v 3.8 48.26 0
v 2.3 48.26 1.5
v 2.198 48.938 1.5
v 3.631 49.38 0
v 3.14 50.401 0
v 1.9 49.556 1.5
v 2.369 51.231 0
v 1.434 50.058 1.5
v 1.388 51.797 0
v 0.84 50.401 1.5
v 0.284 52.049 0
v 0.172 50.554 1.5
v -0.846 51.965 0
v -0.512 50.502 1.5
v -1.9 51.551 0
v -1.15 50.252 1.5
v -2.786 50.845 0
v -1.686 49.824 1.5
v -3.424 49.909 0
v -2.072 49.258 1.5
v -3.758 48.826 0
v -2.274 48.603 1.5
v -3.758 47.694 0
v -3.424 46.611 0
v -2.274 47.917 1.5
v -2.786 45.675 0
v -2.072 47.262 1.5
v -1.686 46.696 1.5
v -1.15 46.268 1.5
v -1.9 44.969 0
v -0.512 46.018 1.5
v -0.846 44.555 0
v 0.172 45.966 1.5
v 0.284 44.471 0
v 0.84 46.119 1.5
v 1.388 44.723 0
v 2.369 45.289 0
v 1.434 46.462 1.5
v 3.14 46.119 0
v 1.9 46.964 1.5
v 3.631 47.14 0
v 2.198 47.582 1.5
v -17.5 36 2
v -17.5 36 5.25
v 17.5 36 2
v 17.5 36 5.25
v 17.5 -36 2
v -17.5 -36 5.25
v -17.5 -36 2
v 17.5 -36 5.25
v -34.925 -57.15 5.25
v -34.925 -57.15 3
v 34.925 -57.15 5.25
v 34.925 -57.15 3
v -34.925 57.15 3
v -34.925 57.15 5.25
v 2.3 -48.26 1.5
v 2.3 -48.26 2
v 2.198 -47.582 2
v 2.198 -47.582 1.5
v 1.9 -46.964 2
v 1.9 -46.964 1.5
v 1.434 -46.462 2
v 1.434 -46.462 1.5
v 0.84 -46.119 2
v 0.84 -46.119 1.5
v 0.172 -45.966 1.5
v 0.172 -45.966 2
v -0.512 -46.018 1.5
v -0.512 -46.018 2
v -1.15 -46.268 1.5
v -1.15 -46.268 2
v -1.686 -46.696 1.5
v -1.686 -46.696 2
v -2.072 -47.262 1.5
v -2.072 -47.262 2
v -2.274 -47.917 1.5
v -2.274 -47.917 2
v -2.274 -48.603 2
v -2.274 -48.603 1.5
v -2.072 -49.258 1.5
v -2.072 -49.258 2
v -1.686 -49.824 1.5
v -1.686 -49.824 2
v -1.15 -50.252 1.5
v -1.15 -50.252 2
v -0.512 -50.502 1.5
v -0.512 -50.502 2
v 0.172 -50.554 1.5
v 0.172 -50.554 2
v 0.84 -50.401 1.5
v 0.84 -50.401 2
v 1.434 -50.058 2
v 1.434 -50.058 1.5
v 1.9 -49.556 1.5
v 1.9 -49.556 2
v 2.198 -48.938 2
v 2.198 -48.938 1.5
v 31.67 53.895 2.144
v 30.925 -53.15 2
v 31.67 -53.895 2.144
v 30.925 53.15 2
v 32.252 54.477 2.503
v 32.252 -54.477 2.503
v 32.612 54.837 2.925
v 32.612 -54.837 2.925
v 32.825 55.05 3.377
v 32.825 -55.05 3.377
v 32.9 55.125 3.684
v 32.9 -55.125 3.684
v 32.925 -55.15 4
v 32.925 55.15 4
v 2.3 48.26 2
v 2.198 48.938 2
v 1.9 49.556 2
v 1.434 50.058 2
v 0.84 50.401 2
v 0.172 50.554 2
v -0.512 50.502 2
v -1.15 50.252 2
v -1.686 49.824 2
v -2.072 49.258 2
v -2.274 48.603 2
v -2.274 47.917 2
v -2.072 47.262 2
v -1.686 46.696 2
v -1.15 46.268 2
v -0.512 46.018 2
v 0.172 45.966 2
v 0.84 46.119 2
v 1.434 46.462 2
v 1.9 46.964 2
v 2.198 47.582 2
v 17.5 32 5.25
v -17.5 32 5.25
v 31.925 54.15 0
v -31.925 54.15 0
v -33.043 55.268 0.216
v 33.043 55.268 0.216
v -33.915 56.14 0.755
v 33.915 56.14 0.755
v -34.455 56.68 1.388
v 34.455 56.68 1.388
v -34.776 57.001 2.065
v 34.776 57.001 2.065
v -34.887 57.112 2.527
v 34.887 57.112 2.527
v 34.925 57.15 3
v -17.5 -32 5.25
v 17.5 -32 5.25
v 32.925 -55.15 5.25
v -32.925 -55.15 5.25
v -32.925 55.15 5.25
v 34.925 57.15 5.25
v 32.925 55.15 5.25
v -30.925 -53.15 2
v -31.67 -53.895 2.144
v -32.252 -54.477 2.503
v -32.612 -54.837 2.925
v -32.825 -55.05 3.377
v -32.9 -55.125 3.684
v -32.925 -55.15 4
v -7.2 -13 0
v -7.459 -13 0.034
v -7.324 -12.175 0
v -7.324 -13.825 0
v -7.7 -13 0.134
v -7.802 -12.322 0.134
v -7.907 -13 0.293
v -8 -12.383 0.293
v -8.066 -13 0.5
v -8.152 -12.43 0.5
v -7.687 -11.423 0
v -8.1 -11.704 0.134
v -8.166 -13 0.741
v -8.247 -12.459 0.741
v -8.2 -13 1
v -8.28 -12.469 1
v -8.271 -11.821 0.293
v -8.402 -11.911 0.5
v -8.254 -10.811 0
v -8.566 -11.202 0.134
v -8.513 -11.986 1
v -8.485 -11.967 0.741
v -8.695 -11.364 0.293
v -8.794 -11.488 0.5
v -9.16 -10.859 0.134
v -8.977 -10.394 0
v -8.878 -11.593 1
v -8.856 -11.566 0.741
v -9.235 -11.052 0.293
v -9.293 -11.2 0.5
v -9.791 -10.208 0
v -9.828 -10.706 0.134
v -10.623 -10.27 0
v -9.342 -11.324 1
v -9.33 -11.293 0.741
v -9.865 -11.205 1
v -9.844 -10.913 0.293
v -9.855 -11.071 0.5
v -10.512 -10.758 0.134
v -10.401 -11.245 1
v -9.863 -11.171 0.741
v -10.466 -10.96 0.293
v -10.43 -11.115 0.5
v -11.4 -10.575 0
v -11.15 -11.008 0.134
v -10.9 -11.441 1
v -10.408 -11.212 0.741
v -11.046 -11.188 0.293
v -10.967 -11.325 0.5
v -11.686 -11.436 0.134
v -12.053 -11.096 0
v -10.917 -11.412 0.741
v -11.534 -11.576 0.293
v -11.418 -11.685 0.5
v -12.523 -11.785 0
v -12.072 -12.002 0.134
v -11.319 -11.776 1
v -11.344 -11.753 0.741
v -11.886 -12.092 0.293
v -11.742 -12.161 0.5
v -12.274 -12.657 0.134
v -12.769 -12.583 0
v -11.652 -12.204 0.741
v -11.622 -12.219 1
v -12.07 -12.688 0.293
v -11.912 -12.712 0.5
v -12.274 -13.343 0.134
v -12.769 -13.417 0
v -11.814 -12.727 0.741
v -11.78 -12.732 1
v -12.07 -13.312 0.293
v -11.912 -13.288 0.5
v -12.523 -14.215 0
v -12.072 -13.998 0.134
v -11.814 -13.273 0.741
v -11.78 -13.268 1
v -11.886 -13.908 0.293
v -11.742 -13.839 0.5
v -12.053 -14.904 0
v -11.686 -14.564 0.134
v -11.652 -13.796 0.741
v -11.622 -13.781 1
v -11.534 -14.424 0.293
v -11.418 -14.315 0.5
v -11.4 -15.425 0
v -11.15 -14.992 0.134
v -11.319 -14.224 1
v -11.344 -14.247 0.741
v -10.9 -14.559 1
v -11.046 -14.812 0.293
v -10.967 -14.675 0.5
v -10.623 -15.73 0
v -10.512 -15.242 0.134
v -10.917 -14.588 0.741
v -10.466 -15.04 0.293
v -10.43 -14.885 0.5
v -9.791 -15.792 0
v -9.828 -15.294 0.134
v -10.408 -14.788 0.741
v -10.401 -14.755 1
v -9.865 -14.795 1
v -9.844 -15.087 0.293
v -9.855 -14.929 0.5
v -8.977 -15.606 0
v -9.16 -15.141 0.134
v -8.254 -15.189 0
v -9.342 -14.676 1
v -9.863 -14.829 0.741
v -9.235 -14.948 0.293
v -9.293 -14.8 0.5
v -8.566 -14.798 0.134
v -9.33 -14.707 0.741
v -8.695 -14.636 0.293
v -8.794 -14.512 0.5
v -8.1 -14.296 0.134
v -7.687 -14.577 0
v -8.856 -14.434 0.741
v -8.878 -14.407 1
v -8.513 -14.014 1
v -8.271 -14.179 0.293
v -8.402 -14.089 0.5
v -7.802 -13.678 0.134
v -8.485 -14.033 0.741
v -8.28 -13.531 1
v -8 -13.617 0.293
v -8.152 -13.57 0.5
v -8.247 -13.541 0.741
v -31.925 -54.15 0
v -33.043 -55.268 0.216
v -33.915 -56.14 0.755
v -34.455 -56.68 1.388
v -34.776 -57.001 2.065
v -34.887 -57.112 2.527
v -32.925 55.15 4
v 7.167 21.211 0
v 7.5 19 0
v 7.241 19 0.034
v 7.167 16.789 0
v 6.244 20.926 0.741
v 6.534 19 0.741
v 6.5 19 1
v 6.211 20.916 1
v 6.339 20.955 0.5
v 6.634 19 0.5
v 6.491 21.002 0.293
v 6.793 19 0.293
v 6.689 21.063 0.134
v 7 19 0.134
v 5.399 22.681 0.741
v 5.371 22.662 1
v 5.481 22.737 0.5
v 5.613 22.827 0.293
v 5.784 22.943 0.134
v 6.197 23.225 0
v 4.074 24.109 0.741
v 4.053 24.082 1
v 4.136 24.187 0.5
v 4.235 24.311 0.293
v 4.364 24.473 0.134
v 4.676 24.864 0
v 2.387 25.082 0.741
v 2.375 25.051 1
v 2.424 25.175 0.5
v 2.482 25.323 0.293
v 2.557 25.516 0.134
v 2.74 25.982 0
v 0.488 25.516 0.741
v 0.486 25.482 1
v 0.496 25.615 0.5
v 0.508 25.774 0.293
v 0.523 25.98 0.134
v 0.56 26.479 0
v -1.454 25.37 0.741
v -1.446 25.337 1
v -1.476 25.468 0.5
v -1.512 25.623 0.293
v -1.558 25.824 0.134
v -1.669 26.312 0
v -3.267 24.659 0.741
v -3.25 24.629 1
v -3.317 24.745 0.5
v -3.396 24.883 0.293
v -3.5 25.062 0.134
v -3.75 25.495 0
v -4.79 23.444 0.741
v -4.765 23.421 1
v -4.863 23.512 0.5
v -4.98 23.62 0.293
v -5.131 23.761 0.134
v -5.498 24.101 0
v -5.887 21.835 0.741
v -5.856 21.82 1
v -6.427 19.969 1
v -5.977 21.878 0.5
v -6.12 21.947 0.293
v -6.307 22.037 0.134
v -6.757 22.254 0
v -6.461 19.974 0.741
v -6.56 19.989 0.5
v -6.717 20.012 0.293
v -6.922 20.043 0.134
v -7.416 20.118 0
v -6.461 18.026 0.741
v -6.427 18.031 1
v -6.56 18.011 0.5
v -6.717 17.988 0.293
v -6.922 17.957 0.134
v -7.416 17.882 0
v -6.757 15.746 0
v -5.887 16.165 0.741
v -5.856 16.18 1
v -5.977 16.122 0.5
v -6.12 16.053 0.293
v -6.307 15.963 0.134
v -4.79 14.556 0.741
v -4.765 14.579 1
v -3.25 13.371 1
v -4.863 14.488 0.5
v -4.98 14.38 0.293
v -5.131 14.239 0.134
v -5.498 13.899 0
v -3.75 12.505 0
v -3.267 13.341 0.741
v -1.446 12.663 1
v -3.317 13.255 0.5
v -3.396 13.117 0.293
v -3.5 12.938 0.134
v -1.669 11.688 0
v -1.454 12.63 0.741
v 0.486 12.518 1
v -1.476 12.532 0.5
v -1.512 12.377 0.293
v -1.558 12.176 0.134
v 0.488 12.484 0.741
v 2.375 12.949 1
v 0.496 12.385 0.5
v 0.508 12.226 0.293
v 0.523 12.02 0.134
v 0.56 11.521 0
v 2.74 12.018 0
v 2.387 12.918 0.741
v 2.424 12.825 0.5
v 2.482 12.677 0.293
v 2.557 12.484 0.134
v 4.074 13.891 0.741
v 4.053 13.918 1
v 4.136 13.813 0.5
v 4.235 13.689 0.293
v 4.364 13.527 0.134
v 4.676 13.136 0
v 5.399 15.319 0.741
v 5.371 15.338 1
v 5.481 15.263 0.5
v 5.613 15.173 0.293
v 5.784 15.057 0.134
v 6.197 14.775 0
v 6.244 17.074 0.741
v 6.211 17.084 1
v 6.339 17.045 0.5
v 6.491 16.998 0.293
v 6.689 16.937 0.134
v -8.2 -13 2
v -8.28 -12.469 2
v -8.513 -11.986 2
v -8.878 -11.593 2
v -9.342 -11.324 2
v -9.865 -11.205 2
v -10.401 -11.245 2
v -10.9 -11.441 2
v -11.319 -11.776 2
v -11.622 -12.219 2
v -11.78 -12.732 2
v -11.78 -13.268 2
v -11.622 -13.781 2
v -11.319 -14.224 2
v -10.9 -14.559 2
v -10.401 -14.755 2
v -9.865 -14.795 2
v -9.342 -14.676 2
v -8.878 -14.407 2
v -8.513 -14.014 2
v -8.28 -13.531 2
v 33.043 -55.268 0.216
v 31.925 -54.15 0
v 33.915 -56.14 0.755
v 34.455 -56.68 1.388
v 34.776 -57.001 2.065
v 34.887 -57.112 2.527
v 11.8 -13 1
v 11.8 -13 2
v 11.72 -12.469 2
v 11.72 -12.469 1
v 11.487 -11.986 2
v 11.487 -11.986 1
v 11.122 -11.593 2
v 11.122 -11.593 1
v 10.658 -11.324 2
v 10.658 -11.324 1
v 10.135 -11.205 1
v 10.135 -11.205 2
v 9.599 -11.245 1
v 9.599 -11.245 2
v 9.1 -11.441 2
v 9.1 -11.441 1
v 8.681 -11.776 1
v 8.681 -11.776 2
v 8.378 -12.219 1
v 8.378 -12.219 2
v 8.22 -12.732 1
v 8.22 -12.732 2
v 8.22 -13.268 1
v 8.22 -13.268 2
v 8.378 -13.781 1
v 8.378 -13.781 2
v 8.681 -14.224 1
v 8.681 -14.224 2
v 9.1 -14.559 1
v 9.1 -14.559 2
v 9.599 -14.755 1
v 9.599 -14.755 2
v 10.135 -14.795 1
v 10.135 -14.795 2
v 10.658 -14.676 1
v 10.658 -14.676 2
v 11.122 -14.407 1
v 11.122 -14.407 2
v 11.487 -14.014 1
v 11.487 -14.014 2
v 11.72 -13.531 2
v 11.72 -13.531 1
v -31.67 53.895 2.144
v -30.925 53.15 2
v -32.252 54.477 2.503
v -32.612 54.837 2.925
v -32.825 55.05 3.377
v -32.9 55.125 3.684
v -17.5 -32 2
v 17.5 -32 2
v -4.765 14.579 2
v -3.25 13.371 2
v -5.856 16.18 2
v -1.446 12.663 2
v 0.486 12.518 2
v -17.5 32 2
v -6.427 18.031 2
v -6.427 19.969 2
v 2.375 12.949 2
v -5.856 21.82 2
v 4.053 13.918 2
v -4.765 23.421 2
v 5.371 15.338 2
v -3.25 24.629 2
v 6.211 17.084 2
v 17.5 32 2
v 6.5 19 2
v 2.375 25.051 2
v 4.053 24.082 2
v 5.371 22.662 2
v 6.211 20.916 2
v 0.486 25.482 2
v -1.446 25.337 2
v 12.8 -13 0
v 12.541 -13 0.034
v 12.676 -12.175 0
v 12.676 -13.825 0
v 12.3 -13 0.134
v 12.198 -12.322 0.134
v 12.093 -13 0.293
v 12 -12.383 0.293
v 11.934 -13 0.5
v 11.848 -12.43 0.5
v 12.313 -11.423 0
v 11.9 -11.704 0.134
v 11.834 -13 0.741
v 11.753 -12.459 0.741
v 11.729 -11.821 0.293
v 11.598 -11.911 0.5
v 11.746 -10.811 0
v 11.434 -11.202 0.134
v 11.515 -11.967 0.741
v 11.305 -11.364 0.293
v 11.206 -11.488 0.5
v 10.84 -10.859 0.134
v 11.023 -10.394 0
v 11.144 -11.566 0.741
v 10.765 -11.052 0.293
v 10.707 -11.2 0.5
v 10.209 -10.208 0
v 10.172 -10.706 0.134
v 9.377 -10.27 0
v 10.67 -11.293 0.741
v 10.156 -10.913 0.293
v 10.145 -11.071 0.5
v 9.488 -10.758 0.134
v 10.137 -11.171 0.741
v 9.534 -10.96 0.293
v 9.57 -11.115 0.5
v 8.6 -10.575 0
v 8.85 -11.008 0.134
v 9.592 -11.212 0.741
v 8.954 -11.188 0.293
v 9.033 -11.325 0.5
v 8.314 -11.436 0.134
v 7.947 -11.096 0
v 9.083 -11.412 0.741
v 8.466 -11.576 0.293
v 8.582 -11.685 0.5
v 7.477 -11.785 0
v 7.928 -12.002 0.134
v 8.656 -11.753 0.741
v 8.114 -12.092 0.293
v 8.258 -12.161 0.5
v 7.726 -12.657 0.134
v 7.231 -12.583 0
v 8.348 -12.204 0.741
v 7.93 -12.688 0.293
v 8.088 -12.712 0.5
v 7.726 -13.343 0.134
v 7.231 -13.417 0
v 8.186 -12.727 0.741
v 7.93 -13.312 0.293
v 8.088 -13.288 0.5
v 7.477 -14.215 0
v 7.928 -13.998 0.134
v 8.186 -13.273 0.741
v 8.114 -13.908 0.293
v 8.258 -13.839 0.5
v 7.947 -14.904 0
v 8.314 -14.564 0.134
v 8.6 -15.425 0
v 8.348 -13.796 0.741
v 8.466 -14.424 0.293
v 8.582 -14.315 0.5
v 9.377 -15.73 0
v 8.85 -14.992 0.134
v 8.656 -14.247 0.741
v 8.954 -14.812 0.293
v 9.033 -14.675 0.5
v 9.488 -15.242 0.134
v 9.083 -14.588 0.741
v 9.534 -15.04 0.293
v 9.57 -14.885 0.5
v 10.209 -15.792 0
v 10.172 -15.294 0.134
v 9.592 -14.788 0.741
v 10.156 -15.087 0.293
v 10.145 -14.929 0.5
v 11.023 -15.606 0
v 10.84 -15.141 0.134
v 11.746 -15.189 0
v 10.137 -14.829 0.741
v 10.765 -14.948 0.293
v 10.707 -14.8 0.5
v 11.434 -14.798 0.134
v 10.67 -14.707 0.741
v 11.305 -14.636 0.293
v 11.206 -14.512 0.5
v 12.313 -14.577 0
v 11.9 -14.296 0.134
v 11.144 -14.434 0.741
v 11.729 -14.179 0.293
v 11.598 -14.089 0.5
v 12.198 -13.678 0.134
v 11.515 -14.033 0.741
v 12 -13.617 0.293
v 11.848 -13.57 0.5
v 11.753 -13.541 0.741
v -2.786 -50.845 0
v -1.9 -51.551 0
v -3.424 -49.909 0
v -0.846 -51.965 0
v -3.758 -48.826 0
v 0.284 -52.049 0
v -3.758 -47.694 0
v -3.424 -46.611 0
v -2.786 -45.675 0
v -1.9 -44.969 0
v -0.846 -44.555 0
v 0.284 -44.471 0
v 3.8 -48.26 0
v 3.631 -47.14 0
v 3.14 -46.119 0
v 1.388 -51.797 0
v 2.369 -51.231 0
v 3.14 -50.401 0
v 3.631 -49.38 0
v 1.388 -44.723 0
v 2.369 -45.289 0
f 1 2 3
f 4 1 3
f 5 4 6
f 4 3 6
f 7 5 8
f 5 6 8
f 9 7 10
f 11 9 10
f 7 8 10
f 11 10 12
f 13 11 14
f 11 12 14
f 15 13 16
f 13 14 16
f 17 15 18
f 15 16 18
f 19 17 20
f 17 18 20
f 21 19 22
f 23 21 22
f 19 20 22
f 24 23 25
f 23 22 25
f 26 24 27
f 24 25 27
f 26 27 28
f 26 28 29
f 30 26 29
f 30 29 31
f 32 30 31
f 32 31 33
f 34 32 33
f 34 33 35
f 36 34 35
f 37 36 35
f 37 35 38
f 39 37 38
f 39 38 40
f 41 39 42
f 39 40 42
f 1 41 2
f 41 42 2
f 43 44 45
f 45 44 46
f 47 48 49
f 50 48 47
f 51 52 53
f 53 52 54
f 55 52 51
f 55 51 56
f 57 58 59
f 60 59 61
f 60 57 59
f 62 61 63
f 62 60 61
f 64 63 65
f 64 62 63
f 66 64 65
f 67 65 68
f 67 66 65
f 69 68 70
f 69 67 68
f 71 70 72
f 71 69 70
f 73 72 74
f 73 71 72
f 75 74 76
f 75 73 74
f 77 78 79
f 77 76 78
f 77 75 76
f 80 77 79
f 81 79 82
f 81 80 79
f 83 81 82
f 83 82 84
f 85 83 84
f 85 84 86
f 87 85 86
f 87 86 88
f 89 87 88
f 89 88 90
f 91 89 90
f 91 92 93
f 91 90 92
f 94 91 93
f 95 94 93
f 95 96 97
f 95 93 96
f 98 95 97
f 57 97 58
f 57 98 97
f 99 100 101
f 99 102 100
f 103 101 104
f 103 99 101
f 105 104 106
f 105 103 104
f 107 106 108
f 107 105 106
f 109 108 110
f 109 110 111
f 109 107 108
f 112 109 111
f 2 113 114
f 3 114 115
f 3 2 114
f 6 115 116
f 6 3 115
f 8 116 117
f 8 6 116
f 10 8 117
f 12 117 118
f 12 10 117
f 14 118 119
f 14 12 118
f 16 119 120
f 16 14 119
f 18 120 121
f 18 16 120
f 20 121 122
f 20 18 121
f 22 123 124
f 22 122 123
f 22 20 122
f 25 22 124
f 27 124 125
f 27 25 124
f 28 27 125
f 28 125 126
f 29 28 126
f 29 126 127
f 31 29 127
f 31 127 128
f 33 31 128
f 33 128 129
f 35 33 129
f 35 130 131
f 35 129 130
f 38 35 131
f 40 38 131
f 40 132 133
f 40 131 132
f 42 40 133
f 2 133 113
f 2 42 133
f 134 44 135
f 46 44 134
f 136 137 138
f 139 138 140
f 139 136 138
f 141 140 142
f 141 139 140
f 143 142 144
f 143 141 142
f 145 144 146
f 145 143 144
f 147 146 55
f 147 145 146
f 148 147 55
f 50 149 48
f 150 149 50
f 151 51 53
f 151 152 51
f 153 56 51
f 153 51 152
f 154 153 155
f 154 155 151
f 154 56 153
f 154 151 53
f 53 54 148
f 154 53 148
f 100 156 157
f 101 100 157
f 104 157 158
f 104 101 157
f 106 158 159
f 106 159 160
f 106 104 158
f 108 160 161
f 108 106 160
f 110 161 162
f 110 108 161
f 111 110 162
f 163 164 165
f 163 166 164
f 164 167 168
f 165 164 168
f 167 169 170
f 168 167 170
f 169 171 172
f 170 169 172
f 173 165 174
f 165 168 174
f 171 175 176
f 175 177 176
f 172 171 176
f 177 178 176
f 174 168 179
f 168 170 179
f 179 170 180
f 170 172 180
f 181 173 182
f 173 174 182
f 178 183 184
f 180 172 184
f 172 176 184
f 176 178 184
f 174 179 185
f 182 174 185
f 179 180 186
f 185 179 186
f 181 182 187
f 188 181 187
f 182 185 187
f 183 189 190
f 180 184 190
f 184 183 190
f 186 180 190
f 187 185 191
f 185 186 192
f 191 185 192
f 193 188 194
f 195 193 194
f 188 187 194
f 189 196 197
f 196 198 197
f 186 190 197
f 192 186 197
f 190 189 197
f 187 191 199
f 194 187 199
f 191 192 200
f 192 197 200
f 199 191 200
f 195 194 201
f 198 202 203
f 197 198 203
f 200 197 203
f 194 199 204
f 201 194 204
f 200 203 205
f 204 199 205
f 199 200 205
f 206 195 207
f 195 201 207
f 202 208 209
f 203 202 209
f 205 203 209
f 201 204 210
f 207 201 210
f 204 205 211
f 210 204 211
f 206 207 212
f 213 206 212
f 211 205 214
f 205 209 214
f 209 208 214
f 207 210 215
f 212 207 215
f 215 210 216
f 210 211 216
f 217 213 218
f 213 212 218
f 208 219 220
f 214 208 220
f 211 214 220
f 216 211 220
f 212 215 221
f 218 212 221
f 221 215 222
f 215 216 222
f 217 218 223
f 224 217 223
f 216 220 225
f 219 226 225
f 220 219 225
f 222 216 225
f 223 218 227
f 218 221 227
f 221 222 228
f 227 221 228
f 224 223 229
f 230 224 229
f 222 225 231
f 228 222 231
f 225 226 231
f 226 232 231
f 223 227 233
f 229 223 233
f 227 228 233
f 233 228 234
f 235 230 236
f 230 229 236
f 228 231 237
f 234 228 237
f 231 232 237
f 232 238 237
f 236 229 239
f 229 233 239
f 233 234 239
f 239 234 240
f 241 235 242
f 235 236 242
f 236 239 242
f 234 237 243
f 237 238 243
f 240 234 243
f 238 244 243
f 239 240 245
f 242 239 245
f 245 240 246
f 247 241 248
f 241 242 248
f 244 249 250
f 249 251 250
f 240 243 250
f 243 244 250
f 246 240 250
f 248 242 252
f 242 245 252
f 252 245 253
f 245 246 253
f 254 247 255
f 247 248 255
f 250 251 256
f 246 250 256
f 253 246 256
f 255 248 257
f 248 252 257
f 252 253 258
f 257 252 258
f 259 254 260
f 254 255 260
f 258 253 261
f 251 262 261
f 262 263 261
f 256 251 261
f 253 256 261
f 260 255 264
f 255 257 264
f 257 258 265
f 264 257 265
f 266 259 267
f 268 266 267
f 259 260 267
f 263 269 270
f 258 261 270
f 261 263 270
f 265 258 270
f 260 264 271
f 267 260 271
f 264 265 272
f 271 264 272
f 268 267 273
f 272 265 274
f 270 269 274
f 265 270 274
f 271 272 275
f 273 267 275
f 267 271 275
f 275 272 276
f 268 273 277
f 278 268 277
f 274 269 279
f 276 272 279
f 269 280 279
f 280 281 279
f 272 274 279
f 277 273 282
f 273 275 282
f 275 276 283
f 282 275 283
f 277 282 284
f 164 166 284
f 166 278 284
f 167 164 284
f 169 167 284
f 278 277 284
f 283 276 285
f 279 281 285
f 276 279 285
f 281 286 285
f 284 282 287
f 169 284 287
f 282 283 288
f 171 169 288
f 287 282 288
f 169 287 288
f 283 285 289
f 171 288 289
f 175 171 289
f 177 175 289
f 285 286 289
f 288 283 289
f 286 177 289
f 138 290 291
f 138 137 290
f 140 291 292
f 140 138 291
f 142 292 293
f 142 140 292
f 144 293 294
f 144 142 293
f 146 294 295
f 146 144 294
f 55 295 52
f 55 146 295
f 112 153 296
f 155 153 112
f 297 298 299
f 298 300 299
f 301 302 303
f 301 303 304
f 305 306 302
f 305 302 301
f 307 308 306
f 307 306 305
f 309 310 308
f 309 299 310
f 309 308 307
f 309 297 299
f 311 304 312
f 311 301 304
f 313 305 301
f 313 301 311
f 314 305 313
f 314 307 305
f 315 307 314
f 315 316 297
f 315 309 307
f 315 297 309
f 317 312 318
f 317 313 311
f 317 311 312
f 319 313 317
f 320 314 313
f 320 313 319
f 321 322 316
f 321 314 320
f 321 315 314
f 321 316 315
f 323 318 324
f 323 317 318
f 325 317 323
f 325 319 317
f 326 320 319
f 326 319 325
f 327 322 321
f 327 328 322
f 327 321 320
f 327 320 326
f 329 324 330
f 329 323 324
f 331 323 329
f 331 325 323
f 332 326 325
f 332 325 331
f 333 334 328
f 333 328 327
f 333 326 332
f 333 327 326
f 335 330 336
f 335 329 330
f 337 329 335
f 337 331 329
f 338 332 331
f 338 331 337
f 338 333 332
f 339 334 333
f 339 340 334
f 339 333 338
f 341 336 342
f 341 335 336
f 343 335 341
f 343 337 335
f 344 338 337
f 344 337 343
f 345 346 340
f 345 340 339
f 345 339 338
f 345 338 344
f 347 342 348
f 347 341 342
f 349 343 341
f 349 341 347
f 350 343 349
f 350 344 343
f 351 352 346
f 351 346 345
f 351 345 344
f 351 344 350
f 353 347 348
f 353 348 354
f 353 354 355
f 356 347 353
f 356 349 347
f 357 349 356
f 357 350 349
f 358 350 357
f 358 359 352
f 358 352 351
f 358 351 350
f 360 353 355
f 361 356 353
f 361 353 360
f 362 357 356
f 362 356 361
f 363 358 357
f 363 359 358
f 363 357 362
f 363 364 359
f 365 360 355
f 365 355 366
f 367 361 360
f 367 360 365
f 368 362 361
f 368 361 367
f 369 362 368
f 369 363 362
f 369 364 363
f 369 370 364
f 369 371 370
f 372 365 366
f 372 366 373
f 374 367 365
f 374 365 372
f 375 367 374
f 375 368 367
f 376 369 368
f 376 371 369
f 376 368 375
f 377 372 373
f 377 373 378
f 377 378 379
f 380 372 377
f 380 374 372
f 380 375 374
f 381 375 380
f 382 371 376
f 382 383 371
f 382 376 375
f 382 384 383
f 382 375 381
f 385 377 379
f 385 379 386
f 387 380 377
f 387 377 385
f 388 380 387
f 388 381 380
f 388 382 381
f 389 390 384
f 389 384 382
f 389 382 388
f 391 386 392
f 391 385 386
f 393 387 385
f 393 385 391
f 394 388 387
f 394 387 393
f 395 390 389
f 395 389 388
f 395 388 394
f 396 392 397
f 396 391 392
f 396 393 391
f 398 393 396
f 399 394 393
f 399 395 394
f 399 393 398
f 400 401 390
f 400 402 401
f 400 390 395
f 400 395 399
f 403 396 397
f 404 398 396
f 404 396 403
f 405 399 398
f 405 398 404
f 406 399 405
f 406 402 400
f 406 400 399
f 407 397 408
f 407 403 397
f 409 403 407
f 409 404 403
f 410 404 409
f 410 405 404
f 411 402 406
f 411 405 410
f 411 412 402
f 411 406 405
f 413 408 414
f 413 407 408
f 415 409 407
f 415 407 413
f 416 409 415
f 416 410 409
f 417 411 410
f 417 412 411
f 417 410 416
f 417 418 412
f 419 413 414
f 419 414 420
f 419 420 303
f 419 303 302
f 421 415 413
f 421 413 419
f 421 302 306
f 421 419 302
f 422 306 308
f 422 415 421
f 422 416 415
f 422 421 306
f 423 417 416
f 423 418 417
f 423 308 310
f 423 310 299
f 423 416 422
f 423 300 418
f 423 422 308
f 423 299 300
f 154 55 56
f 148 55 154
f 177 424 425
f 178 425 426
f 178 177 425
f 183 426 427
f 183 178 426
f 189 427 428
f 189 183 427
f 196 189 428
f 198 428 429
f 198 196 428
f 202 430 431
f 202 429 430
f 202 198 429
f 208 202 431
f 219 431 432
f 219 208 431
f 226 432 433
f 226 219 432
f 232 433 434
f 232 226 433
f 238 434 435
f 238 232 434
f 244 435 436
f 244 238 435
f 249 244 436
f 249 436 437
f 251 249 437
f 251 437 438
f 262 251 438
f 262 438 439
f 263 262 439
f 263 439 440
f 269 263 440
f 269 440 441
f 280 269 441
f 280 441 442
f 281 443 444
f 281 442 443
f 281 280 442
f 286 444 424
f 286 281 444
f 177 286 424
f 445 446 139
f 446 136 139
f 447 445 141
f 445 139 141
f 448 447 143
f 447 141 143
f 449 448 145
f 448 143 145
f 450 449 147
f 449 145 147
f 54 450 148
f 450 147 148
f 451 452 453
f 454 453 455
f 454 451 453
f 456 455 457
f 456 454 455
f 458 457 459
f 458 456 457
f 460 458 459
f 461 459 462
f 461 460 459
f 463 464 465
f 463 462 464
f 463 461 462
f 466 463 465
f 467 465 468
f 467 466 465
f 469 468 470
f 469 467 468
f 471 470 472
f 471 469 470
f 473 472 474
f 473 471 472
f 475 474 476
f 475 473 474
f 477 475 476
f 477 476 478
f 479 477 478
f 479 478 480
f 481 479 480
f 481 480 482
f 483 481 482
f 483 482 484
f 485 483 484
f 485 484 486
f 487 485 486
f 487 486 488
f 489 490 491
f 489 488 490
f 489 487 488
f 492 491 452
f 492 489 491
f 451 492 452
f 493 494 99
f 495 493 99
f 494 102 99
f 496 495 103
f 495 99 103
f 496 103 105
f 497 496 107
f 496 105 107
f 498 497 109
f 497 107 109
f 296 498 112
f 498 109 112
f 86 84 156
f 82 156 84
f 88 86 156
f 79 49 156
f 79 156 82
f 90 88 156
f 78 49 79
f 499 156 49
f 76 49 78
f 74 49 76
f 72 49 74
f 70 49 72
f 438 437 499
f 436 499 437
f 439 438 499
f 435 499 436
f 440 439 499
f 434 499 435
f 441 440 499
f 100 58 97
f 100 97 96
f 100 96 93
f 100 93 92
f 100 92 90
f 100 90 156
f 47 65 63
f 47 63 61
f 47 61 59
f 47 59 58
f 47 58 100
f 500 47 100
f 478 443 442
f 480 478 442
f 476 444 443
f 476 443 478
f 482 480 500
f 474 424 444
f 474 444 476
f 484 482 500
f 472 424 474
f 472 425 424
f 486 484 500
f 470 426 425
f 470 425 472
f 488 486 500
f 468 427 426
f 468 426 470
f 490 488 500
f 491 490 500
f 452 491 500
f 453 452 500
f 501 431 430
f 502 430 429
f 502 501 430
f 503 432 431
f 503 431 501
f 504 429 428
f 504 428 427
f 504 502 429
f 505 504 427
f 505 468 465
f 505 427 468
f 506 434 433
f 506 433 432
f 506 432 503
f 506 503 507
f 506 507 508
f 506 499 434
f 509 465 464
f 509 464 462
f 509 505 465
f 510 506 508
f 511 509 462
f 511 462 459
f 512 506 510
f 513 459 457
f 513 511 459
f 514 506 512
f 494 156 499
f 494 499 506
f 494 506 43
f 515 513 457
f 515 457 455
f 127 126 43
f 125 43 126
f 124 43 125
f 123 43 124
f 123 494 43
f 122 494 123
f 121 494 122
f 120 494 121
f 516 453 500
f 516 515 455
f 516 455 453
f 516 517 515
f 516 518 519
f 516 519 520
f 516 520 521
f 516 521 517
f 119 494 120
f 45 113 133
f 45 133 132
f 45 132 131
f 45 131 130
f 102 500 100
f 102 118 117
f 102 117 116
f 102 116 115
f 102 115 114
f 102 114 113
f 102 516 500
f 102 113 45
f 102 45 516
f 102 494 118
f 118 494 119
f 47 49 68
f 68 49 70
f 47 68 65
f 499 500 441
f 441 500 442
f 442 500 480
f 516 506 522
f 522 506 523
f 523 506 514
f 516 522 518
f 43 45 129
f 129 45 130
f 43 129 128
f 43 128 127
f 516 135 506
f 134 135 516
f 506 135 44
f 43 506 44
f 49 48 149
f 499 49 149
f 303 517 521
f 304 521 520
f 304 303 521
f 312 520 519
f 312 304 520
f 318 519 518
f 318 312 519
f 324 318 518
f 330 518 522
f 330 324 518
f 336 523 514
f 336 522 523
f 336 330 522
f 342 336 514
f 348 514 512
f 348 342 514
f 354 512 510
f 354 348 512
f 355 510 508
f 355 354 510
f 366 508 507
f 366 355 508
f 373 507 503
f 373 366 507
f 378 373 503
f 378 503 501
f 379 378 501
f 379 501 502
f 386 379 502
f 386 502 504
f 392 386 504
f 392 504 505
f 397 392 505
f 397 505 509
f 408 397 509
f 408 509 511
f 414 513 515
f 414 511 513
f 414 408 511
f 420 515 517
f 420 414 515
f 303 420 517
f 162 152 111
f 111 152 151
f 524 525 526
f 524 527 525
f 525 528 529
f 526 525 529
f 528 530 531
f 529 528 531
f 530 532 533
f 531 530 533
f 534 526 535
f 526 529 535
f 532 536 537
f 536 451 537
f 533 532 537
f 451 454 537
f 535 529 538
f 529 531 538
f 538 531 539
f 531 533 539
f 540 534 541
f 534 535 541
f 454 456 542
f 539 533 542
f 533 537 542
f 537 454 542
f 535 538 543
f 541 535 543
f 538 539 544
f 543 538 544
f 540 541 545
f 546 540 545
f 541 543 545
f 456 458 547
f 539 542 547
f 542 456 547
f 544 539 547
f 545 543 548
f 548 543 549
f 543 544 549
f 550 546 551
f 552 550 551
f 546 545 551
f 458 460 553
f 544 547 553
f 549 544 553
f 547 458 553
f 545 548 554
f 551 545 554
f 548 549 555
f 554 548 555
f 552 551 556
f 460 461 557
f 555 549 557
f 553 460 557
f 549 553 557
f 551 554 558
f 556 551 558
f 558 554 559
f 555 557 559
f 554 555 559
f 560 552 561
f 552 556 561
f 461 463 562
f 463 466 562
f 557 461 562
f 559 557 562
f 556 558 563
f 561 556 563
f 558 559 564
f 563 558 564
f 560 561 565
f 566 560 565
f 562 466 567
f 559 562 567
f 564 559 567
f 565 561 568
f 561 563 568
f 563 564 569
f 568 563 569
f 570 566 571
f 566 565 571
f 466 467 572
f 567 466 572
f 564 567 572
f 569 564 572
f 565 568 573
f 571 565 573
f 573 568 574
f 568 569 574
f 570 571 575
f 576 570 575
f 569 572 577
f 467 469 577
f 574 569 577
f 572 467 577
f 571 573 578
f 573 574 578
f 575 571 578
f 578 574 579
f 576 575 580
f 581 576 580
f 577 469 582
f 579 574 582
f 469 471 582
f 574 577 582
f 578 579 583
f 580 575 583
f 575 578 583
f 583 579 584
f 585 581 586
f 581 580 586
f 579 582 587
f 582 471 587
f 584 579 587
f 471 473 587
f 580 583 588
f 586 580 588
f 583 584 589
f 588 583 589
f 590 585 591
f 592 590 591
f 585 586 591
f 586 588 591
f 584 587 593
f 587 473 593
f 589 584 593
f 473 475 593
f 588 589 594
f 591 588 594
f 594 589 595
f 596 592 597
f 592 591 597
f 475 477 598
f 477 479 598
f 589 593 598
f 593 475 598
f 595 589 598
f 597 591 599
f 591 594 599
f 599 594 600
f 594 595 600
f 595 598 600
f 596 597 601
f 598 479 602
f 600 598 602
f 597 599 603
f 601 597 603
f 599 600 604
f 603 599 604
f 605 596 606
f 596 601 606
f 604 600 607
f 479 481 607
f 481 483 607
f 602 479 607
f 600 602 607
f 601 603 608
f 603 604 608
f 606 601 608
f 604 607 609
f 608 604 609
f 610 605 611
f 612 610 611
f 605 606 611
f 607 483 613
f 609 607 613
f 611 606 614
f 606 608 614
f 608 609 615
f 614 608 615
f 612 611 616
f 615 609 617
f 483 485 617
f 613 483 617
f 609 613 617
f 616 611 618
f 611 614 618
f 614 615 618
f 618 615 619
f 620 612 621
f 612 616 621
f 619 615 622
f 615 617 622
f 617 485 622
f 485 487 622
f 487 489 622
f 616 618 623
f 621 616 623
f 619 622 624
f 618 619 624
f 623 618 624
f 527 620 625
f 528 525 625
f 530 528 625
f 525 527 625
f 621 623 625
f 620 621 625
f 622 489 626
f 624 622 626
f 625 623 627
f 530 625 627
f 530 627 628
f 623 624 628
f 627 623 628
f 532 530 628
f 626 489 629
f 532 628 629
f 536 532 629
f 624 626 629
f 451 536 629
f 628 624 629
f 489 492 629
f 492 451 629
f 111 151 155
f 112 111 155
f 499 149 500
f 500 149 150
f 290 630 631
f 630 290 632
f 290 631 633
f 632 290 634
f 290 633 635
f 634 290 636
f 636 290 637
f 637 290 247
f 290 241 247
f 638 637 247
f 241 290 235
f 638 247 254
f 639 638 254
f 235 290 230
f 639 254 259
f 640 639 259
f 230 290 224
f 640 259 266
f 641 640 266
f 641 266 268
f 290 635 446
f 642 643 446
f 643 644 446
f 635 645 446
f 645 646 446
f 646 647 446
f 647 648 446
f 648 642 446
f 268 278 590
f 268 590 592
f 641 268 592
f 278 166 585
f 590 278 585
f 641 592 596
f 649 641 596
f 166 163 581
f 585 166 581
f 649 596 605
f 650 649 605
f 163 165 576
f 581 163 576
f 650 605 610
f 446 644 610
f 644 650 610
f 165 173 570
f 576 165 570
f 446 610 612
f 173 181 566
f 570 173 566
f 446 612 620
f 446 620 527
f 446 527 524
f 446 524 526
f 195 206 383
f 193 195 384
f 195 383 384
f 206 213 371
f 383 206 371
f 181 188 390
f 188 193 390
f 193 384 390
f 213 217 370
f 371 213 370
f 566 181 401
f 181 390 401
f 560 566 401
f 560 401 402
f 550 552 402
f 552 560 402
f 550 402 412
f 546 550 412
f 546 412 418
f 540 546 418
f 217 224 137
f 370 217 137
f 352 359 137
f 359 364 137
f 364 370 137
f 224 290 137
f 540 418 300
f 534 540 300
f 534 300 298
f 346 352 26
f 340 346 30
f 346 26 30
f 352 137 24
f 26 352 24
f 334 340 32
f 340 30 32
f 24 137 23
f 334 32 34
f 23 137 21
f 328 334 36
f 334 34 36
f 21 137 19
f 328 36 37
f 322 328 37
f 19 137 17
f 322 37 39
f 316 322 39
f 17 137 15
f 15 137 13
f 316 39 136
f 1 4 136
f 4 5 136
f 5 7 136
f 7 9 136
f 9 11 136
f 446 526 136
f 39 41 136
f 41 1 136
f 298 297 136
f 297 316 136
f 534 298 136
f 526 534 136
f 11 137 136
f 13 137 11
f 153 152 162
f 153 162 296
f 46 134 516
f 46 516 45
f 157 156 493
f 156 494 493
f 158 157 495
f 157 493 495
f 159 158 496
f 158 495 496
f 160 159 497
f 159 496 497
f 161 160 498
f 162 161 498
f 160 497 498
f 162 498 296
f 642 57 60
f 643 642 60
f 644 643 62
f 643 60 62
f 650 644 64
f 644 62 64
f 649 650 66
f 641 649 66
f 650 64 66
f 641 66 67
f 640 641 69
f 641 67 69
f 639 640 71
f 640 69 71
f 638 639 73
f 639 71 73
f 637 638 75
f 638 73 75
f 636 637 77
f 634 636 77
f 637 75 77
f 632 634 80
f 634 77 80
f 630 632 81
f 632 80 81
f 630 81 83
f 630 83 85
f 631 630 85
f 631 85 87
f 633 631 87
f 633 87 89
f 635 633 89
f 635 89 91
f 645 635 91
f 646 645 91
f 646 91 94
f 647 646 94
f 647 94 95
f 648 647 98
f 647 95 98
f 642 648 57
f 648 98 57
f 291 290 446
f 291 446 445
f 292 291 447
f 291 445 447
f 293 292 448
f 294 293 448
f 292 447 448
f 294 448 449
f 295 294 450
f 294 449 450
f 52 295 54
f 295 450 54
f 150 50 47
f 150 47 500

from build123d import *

# Parameters (mm, degrees)
SKETCH_W      = 69.85
SKETCH_H      = 114.3
SKETCH_R      = 2.3
SKETCH_R_2    = 6.5
SKETCH_R_3    = 1.8
PAD_DEPTH     = 5.25
FILLET_R      = 1
CHAMFER_SIZE  = 1.5
FILLET001_R   = 1
FILLET002_R   = 3
SKETCH001_W   = 65.85
SKETCH001_H   = 110.3
SKETCH001_W_2 = 35
SKETCH001_H_2 = 4
POCKET_DEPTH  = 3.25
FILLET003_R   = 2


with BuildPart() as part:
    # Sketch → Pad (new body)
    with BuildSketch(Plane.XY):
        Rectangle(SKETCH_W, SKETCH_H)
        with Locations((0, 48.26)):
            Circle(SKETCH_R, mode=Mode.SUBTRACT)
        with Locations((0, -48.26)):
            Circle(SKETCH_R, mode=Mode.SUBTRACT)
        with Locations((0, 19)):
            Circle(SKETCH_R_2, mode=Mode.SUBTRACT)
        with Locations((-10, -13)):
            Circle(SKETCH_R_3, mode=Mode.SUBTRACT)
        with Locations((10, -13)):
            Circle(SKETCH_R_3, mode=Mode.SUBTRACT)
    extrude(amount=PAD_DEPTH)

    # Fillet
    fillet_edges = [part.edges().sort_by_distance(p)[0] for p in [
        (-6.5, 19, 0),
    ]]
    fillet(fillet_edges, radius=FILLET_R)

    # Chamfer
    chamfer_edges = [part.edges().sort_by_distance(p)[0] for p in [
        (-2.3, 48.26, 0),
        (-2.3, -48.26, 0),
    ]]
    chamfer(chamfer_edges, length=CHAMFER_SIZE)

    # Fillet001
    fillet001_edges = [part.edges().sort_by_distance(p)[0] for p in [
        (-11.8, -13, 0),
        (8.2, -13, 0),
    ]]
    fillet(fillet001_edges, radius=FILLET001_R)

    # Fillet002
    fillet002_edges = [part.edges().sort_by_distance(p)[0] for p in [
        (0, 57.15, 0),
        (-34.925, 0, 0),
        (34.925, 0, 0),
        (0, -57.15, 0),
    ]]
    fillet(fillet002_edges, radius=FILLET002_R)

    # Sketch001 (on Face20 of Fillet002) → Pocket (cut)
    with BuildSketch(Plane.XY.offset(5.25)):
        Rectangle(SKETCH001_W, SKETCH001_H)
        with Locations((0, 34)):
            Rectangle(SKETCH001_W_2, SKETCH001_H_2, mode=Mode.SUBTRACT)
        with Locations((0, -34)):
            Rectangle(SKETCH001_W_2, SKETCH001_H_2, mode=Mode.SUBTRACT)
    extrude(amount=-POCKET_DEPTH, mode=Mode.SUBTRACT)

    # Fillet003
    fillet003_edges = [part.edges().sort_by_distance(p)[0] for p in [
        (-32.925, 0, 2),
        (0, 55.15, 2),
        (32.925, 0, 2),
        (0, -55.15, 2),
    ]]
    fillet(fillet003_edges, radius=FILLET003_R)


solid = part.part
